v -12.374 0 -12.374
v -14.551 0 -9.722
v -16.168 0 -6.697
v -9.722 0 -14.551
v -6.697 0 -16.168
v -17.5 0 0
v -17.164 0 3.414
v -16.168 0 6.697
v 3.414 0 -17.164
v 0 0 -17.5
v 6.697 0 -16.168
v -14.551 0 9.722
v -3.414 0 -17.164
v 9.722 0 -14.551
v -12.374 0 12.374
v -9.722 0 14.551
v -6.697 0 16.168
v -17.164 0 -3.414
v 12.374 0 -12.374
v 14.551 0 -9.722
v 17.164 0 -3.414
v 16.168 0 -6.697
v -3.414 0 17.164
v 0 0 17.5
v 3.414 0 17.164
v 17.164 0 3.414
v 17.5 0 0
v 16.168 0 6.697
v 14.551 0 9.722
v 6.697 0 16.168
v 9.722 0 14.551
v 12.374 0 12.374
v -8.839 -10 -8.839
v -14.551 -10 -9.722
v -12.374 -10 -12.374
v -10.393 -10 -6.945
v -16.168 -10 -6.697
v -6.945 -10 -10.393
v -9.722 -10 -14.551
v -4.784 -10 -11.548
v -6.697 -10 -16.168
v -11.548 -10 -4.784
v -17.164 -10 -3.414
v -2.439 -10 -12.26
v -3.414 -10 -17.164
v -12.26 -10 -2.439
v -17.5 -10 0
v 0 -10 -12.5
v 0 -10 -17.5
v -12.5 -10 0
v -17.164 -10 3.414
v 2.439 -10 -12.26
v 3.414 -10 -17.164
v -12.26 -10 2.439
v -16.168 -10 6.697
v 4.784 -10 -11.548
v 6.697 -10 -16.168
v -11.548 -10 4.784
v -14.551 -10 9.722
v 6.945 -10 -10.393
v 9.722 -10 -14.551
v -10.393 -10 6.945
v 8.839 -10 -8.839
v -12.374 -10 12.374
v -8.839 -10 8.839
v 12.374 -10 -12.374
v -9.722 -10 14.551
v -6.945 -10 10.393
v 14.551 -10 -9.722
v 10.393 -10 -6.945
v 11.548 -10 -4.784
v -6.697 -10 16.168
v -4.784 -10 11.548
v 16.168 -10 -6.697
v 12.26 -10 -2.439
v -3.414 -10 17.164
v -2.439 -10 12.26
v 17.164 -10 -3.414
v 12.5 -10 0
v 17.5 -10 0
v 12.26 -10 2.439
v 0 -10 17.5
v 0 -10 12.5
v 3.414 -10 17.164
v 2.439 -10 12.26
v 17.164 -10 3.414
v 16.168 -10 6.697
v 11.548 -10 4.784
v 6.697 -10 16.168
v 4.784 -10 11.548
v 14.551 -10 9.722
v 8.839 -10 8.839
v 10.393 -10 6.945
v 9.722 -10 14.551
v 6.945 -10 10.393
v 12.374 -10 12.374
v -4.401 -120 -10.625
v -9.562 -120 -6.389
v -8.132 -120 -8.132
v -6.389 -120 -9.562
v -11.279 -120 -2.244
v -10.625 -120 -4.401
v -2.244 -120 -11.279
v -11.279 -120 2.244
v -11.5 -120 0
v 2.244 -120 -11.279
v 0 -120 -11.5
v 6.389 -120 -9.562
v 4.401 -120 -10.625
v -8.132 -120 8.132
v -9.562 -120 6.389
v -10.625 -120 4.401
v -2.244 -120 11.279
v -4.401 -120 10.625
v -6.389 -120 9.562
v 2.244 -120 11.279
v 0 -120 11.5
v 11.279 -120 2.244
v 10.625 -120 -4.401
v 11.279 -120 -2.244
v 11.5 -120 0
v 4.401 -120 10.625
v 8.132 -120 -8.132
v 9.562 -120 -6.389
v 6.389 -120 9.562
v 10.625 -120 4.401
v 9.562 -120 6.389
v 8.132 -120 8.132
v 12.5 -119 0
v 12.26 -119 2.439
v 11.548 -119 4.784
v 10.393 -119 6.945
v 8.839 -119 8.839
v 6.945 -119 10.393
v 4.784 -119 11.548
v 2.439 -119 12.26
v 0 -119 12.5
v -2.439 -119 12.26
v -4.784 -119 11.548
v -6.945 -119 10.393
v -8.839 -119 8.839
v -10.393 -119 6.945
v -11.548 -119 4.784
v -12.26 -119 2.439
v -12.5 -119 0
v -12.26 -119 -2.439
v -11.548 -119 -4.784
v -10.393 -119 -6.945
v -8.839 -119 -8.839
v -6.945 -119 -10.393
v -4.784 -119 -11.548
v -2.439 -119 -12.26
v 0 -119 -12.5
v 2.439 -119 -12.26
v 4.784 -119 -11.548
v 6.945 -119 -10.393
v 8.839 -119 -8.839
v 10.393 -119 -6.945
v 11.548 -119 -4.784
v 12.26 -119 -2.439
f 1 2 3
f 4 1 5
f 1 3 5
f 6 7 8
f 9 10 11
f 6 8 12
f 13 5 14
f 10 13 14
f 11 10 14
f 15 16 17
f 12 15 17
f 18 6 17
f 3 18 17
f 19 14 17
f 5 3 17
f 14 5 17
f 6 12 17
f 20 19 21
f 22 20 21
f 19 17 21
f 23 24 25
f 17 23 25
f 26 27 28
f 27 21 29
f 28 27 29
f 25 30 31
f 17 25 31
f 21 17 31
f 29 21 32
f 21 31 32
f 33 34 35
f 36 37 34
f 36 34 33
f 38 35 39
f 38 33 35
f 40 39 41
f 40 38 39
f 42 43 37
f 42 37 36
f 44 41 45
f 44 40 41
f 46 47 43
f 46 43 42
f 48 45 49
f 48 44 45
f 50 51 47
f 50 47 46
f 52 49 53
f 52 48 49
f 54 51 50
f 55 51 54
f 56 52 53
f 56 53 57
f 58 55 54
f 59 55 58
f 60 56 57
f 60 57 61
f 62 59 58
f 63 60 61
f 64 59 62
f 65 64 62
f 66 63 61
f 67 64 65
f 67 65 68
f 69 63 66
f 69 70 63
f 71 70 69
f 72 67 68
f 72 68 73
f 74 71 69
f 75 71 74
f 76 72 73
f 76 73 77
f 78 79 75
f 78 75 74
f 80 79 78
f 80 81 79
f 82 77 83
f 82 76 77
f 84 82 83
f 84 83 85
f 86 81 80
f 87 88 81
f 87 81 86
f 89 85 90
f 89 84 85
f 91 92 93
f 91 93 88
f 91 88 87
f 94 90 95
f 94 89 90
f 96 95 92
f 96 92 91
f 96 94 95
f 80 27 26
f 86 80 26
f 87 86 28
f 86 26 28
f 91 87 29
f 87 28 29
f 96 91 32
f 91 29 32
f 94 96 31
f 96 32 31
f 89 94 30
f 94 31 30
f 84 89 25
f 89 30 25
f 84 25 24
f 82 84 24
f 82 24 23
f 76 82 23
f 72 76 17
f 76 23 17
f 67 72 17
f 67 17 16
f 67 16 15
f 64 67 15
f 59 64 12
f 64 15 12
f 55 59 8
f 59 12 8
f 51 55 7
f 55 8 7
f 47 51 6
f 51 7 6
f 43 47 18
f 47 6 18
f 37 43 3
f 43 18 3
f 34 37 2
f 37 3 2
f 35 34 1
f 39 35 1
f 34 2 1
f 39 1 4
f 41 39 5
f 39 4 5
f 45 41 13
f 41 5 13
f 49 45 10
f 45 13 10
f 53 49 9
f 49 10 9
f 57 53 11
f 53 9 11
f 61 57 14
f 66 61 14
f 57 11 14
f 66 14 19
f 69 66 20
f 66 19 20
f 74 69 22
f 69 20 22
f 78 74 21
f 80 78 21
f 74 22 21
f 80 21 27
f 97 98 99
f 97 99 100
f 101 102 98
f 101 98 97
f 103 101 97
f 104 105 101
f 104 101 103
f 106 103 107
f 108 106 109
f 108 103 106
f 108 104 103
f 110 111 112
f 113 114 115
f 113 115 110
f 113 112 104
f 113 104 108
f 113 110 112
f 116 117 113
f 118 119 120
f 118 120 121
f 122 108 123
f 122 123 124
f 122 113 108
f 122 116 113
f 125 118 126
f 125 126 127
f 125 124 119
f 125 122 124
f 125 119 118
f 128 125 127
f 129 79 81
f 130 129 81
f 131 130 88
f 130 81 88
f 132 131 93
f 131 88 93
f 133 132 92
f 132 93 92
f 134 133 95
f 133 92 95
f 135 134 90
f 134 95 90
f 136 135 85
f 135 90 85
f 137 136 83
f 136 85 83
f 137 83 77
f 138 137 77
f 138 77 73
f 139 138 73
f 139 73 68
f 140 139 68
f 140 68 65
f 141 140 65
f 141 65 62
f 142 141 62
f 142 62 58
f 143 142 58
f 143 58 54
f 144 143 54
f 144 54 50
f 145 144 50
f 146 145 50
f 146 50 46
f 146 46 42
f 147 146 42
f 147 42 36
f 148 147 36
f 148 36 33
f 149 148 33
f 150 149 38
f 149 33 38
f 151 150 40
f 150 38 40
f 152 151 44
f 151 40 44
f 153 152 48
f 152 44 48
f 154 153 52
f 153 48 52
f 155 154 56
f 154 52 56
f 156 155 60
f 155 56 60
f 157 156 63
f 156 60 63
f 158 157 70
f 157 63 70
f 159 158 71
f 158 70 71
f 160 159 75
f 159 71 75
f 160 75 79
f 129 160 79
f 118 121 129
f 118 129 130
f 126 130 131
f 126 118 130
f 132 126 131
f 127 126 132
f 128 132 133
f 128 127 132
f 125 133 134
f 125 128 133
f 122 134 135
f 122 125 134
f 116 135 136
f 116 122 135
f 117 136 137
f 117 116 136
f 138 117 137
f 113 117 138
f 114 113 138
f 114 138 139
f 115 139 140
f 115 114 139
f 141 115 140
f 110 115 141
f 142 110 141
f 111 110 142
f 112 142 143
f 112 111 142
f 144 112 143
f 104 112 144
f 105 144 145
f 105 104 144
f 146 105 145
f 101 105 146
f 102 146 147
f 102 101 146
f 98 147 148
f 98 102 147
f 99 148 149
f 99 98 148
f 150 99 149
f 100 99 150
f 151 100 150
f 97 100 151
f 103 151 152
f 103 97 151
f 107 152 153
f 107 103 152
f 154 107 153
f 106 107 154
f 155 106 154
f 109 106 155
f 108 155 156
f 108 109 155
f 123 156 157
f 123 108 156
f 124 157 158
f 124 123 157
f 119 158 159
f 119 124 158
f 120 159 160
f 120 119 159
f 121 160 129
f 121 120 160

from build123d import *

# Parameters (mm, degrees)
F0_R     = 12.5
F1_DEPTH = 120
F2_SIZE  = 1
F3_R     = 17.5
F4_DEPTH = 10


with BuildPart() as f1:
    # F0 (on Front) → F1 (new body)
    with BuildSketch(Plane.XZ):
        Circle(F0_R)
    extrude(amount=F1_DEPTH)

    # F2
    f2_edges = [f1.edges().sort_by_distance(p)[0] for p in [
        (-12.5, -120, 0),
        (-12.5, 0, 0),
    ]]
    chamfer(f2_edges, length=F2_SIZE)

    # F3 (on Front) → F4 (join)
    with BuildSketch(Plane.XZ):
        Circle(F3_R)
    extrude(amount=F4_DEPTH)


solid = f1.part
